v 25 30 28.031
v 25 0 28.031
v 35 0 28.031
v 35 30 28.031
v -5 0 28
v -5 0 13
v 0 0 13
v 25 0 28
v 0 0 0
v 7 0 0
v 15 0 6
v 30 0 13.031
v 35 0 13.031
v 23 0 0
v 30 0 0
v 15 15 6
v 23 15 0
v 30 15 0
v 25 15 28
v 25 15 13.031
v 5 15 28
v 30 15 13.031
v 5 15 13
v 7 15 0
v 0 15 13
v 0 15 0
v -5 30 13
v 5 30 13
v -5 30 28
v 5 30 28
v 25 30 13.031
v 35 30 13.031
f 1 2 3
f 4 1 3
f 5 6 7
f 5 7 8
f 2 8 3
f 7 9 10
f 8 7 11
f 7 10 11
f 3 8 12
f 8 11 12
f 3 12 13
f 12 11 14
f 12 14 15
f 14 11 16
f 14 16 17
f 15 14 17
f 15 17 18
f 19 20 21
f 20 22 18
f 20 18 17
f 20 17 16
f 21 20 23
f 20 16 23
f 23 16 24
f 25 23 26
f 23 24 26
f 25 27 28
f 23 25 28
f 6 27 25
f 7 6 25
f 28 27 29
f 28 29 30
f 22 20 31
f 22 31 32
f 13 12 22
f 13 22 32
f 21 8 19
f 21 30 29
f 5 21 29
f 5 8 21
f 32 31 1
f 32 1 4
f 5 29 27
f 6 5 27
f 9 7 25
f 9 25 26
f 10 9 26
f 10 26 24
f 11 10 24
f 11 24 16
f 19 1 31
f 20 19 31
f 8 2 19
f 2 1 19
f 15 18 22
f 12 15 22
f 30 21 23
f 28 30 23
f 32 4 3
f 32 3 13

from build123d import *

# Parameters (mm, degrees)
EXTRUDE_1_DEPTH      = 15
EXTRUDE_7_DEPTH      = 15
EXTRUDE_7_DEPTH_BACK = 15
SKETCH_2_W           = 10
SKETCH_2_H           = 15


with BuildPart() as part:
    # 草图1 → 凸台-拉伸1 (new body)
    with BuildSketch(Plane(origin=(0, 0, 0), x_dir=(1, 0, 0), z_dir=(0, 1, 0))):
        Polygon((0, 0), (7, 0), (15, -6), (23, 0), (30, 0), (30, -28), (0, -28), align=None)
    extrude(amount=EXTRUDE_1_DEPTH)

    # 草图2 → 凸台-拉伸7 (add, two sides: drawn at the far end of the back side and taken through both)
    with BuildSketch(Plane(origin=(0, 15, 0), x_dir=(1, 0, 0), z_dir=(0, 1, 0)).offset(-EXTRUDE_7_DEPTH_BACK)):
        with Locations((30, -20.531171216)):
            Rectangle(SKETCH_2_W, SKETCH_2_H)
        with Locations((0, -20.5)):
            Rectangle(SKETCH_2_W, SKETCH_2_H)
    extrude(amount=EXTRUDE_7_DEPTH + EXTRUDE_7_DEPTH_BACK)


solid = part.part
